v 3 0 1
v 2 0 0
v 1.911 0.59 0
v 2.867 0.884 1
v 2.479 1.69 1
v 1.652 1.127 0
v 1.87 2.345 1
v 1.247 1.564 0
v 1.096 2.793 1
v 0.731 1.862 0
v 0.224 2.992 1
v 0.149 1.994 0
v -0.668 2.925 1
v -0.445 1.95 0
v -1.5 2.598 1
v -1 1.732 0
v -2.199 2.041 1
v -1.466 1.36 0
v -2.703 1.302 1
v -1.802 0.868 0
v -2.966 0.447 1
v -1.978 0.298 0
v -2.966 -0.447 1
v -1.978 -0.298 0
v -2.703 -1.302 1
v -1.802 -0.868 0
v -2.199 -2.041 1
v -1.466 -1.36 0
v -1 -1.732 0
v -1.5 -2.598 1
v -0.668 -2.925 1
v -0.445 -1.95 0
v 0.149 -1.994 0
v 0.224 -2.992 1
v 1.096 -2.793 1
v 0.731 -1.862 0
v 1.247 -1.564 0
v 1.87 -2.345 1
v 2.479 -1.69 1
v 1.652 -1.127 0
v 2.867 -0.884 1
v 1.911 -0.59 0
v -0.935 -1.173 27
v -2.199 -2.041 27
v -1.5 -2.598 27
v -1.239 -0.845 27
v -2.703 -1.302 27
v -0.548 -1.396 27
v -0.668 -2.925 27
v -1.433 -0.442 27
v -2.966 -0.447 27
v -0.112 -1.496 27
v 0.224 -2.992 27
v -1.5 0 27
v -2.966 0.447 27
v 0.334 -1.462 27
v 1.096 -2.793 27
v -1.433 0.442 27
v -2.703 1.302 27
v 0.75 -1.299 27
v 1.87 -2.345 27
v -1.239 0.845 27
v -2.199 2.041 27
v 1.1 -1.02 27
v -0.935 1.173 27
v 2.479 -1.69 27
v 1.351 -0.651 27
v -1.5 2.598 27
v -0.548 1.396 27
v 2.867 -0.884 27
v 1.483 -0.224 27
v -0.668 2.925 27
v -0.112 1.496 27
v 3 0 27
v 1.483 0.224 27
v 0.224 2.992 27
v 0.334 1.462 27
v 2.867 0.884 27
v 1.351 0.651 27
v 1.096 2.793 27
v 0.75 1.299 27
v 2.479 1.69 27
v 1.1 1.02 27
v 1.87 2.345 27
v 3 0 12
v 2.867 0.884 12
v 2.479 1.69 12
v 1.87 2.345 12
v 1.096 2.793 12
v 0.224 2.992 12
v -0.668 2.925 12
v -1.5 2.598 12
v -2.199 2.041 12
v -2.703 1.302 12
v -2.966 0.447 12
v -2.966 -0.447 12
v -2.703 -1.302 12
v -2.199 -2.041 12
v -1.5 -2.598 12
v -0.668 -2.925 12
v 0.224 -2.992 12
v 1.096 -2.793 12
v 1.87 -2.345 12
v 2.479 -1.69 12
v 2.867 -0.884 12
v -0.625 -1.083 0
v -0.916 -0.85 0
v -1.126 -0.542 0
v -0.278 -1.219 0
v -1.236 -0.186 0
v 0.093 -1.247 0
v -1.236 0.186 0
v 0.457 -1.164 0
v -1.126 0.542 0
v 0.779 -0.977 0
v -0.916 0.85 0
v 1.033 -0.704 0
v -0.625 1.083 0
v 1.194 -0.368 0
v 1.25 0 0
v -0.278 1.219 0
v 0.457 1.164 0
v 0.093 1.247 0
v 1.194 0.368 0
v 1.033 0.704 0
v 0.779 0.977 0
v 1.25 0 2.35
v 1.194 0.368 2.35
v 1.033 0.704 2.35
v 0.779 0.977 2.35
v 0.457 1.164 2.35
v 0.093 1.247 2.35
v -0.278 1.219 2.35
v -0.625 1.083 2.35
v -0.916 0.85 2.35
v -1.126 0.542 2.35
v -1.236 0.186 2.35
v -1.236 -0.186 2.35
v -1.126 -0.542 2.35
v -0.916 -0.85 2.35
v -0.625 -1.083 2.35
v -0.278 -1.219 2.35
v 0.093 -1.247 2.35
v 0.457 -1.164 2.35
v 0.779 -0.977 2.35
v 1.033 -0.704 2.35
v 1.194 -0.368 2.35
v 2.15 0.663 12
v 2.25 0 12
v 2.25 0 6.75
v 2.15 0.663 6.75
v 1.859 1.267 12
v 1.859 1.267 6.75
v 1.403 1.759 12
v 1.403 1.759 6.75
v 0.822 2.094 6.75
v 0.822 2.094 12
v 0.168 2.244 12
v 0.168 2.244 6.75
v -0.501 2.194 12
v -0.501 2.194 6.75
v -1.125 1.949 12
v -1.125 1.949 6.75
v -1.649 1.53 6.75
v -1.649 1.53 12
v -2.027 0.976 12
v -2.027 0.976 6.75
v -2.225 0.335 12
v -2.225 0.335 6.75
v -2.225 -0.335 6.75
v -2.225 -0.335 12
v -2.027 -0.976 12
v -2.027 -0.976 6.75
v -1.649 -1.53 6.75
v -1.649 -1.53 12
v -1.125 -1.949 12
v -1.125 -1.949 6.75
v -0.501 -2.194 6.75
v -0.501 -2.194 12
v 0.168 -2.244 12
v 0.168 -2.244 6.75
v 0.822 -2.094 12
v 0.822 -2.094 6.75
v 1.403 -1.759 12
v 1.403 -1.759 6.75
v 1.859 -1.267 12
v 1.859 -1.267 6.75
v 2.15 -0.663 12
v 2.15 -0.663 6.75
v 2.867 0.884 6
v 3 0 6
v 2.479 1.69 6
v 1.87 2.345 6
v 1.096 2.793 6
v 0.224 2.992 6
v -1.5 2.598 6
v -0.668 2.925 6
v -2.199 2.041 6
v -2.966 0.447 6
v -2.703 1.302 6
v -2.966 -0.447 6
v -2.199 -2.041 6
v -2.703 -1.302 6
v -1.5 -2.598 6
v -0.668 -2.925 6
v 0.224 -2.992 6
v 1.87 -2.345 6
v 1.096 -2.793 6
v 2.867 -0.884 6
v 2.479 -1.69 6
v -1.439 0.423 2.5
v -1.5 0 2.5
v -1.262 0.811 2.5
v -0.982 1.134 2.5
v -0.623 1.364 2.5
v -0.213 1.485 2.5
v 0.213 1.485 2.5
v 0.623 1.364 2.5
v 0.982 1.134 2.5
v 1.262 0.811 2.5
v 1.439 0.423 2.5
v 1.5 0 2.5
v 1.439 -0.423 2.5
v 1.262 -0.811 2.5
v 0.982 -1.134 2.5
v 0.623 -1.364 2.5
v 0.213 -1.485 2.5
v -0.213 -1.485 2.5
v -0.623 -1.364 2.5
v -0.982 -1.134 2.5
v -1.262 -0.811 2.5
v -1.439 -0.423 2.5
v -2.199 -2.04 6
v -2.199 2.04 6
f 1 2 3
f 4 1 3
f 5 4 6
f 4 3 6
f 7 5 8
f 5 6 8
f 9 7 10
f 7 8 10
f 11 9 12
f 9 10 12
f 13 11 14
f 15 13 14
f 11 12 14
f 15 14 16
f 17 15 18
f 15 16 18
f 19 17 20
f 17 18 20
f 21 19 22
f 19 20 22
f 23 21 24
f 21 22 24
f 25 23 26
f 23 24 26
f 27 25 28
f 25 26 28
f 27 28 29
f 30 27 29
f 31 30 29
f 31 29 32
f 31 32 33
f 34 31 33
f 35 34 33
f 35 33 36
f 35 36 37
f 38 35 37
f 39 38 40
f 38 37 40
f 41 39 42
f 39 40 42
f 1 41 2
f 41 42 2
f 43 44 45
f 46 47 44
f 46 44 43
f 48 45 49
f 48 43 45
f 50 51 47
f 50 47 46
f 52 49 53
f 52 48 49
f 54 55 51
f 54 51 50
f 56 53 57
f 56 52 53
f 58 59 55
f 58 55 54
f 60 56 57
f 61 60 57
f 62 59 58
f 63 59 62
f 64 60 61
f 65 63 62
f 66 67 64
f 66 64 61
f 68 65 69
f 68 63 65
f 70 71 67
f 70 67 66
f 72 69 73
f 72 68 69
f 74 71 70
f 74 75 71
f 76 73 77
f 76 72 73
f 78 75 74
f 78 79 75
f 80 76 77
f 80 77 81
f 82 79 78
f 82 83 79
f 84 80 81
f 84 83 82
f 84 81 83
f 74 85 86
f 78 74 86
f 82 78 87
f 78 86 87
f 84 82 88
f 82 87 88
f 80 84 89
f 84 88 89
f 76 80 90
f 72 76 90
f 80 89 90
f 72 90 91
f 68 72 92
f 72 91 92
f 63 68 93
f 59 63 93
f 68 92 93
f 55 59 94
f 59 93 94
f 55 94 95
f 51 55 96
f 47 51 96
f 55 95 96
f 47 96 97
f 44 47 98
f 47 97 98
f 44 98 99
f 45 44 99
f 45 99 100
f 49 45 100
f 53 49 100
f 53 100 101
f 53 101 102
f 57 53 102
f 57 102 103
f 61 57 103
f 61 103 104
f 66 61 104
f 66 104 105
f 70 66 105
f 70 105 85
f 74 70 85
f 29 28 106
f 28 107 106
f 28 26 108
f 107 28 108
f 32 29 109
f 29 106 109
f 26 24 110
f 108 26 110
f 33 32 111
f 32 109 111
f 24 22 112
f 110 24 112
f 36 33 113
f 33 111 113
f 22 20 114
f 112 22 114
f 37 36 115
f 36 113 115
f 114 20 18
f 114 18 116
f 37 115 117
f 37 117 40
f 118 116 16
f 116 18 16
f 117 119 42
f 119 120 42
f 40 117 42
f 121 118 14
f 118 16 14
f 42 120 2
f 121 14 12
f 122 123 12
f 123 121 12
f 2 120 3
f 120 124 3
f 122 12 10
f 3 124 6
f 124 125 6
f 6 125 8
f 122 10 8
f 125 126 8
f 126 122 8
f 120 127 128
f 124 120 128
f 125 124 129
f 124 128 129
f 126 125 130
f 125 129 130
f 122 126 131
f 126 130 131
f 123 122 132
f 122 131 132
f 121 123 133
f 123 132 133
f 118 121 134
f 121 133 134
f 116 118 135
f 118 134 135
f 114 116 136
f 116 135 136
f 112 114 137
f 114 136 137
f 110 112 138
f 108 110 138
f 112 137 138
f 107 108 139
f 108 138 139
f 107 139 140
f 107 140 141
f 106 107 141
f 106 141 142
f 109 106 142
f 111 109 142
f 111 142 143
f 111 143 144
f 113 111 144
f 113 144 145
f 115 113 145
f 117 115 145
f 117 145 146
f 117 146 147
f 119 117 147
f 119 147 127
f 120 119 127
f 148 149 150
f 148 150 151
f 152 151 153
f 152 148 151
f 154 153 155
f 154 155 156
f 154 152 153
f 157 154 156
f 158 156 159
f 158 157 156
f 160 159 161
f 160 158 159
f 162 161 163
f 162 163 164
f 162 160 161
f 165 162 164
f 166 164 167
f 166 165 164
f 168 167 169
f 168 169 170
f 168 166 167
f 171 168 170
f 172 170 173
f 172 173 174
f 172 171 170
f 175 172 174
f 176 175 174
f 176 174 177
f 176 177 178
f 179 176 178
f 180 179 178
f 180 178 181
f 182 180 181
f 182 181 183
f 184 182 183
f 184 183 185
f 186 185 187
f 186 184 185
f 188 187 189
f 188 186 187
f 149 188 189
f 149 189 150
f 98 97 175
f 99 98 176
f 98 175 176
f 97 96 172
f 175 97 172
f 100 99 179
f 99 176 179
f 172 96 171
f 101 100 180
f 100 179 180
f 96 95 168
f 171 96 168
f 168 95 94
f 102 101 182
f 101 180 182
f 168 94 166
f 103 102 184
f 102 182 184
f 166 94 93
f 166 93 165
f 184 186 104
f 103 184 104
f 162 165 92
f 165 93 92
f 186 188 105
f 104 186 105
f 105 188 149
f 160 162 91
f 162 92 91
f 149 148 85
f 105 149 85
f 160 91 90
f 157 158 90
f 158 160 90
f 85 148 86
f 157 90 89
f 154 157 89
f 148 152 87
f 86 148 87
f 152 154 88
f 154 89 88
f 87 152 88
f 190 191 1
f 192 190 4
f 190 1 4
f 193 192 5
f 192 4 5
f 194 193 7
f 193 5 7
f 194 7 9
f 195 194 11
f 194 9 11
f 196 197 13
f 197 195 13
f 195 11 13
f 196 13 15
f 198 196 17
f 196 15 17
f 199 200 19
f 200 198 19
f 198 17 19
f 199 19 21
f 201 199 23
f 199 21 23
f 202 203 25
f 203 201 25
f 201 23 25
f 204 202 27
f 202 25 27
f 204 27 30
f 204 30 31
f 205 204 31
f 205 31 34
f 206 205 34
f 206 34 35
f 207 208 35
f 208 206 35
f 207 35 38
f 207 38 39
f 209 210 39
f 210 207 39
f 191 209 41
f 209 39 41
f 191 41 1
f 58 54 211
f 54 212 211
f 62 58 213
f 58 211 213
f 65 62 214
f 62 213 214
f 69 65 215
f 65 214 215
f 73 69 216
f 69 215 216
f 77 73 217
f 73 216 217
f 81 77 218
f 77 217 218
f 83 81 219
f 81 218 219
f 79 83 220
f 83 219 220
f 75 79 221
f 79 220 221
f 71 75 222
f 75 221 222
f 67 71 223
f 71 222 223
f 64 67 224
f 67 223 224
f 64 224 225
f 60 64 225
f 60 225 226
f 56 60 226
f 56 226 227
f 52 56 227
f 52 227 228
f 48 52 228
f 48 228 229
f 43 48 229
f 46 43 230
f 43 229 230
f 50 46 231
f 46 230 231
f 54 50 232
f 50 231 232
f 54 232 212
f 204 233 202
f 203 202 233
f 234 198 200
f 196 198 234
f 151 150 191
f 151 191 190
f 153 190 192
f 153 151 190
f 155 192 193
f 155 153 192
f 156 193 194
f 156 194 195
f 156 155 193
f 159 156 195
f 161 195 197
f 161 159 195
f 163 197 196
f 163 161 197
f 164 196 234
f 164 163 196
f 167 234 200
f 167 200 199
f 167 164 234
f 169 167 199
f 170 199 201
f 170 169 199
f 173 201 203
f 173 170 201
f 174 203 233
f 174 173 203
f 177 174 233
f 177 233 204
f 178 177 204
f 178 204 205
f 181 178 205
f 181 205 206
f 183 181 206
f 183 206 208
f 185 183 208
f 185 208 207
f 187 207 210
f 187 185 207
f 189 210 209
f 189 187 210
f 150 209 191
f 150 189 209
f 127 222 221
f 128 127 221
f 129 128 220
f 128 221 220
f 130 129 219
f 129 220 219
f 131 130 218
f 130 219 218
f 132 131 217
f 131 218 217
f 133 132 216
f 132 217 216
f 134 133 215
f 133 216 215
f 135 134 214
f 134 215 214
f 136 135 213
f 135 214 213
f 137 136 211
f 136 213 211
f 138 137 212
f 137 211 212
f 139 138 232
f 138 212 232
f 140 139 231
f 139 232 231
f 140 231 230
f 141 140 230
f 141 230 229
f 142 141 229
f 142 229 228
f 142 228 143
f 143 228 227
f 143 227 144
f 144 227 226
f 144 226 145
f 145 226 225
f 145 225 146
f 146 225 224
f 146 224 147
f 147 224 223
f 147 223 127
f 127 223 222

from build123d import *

# Parameters (mm, degrees)
ESQUISSE1_R                         = 3
BOSS_EXTRU_1_DEPTH                  = 27
DIAM_TRE_DU_PER_AGE_3_0_3_1_D       = 3
DIAM_TRE_DU_PER_AGE_3_0_3_1_DEPTH   = 24.5
DIAM_TRE_DU_PER_AGE_3_0_3_1_TIP     = 0.901290929
DIAM_TRE_DU_PER_AGE_2_5_2_5_1_D     = 2.5
DIAM_TRE_DU_PER_AGE_2_5_2_5_1_DEPTH = 3
DIAM_TRE_DU_PER_AGE_2_5_2_5_1_TIP   = 0.751075774
ENL_V_START                         = -15
ESQUISSE6_W                         = 11.750178357
ESQUISSE6_H                         = 11.384595502
ESQUISSE6_R                         = 2.25
ENL_V_MAT_EXTRU_1_DEPTH             = 6
CHANFREIN1_SIZE                     = 1
CHANFREIN2_SIZE                     = 0.75


with BuildPart() as part:
    # Esquisse1 → Boss.-Extru.1 (new body)
    with BuildSketch(Plane.XY):
        Circle(ESQUISSE1_R)
    extrude(amount=BOSS_EXTRU_1_DEPTH)

    # Diamètre du perçage Ø3.0 (3)1
    with Locations(Plane.XY.offset(27)):
        with Locations((0, 0)):
            Hole(DIAM_TRE_DU_PER_AGE_3_0_3_1_D / 2, depth=DIAM_TRE_DU_PER_AGE_3_0_3_1_DEPTH)
            with Locations((0, 0, -(DIAM_TRE_DU_PER_AGE_3_0_3_1_DEPTH + DIAM_TRE_DU_PER_AGE_3_0_3_1_TIP / 2))):  # 118° drill point
                Cone(0, DIAM_TRE_DU_PER_AGE_3_0_3_1_D / 2, DIAM_TRE_DU_PER_AGE_3_0_3_1_TIP, mode=Mode.SUBTRACT)

    # Diamètre du perçage Ø2.5 (2.5)1
    with Locations(Plane(origin=(0, 0, 0), x_dir=(-1, 0, 0), z_dir=(0, 0, -1))):
        with Locations((0, 0)):
            Hole(DIAM_TRE_DU_PER_AGE_2_5_2_5_1_D / 2, depth=DIAM_TRE_DU_PER_AGE_2_5_2_5_1_DEPTH)
            with Locations((0, 0, -(DIAM_TRE_DU_PER_AGE_2_5_2_5_1_DEPTH + DIAM_TRE_DU_PER_AGE_2_5_2_5_1_TIP / 2))):  # 118° drill point
                Cone(0, DIAM_TRE_DU_PER_AGE_2_5_2_5_1_D / 2, DIAM_TRE_DU_PER_AGE_2_5_2_5_1_TIP, mode=Mode.SUBTRACT)

    # Esquisse6 → Enlèv. mat.-Extru.1 (cut)
    with BuildSketch(Plane.XY.offset(27).offset(ENL_V_START)):
        with Locations((-0.219764127, 0.428836611)):
            Rectangle(ESQUISSE6_W, ESQUISSE6_H)
        Circle(ESQUISSE6_R, mode=Mode.SUBTRACT)
    extrude(amount=-ENL_V_MAT_EXTRU_1_DEPTH, mode=Mode.SUBTRACT)

    # Chanfrein1
    chanfrein1_edges = [part.edges().sort_by_distance(p)[0] for p in [
        (-3, 0, 0),
    ]]
    chamfer(chanfrein1_edges, length=CHANFREIN1_SIZE)

    # Chanfrein2
    chanfrein2_edges = [part.edges().sort_by_distance(p)[0] for p in [
        (-2.25, 0, 6),
    ]]
    chamfer(chanfrein2_edges, length=CHANFREIN2_SIZE - 0.0001)  # a hair under: the kernel refuses the full size


solid = part.part
